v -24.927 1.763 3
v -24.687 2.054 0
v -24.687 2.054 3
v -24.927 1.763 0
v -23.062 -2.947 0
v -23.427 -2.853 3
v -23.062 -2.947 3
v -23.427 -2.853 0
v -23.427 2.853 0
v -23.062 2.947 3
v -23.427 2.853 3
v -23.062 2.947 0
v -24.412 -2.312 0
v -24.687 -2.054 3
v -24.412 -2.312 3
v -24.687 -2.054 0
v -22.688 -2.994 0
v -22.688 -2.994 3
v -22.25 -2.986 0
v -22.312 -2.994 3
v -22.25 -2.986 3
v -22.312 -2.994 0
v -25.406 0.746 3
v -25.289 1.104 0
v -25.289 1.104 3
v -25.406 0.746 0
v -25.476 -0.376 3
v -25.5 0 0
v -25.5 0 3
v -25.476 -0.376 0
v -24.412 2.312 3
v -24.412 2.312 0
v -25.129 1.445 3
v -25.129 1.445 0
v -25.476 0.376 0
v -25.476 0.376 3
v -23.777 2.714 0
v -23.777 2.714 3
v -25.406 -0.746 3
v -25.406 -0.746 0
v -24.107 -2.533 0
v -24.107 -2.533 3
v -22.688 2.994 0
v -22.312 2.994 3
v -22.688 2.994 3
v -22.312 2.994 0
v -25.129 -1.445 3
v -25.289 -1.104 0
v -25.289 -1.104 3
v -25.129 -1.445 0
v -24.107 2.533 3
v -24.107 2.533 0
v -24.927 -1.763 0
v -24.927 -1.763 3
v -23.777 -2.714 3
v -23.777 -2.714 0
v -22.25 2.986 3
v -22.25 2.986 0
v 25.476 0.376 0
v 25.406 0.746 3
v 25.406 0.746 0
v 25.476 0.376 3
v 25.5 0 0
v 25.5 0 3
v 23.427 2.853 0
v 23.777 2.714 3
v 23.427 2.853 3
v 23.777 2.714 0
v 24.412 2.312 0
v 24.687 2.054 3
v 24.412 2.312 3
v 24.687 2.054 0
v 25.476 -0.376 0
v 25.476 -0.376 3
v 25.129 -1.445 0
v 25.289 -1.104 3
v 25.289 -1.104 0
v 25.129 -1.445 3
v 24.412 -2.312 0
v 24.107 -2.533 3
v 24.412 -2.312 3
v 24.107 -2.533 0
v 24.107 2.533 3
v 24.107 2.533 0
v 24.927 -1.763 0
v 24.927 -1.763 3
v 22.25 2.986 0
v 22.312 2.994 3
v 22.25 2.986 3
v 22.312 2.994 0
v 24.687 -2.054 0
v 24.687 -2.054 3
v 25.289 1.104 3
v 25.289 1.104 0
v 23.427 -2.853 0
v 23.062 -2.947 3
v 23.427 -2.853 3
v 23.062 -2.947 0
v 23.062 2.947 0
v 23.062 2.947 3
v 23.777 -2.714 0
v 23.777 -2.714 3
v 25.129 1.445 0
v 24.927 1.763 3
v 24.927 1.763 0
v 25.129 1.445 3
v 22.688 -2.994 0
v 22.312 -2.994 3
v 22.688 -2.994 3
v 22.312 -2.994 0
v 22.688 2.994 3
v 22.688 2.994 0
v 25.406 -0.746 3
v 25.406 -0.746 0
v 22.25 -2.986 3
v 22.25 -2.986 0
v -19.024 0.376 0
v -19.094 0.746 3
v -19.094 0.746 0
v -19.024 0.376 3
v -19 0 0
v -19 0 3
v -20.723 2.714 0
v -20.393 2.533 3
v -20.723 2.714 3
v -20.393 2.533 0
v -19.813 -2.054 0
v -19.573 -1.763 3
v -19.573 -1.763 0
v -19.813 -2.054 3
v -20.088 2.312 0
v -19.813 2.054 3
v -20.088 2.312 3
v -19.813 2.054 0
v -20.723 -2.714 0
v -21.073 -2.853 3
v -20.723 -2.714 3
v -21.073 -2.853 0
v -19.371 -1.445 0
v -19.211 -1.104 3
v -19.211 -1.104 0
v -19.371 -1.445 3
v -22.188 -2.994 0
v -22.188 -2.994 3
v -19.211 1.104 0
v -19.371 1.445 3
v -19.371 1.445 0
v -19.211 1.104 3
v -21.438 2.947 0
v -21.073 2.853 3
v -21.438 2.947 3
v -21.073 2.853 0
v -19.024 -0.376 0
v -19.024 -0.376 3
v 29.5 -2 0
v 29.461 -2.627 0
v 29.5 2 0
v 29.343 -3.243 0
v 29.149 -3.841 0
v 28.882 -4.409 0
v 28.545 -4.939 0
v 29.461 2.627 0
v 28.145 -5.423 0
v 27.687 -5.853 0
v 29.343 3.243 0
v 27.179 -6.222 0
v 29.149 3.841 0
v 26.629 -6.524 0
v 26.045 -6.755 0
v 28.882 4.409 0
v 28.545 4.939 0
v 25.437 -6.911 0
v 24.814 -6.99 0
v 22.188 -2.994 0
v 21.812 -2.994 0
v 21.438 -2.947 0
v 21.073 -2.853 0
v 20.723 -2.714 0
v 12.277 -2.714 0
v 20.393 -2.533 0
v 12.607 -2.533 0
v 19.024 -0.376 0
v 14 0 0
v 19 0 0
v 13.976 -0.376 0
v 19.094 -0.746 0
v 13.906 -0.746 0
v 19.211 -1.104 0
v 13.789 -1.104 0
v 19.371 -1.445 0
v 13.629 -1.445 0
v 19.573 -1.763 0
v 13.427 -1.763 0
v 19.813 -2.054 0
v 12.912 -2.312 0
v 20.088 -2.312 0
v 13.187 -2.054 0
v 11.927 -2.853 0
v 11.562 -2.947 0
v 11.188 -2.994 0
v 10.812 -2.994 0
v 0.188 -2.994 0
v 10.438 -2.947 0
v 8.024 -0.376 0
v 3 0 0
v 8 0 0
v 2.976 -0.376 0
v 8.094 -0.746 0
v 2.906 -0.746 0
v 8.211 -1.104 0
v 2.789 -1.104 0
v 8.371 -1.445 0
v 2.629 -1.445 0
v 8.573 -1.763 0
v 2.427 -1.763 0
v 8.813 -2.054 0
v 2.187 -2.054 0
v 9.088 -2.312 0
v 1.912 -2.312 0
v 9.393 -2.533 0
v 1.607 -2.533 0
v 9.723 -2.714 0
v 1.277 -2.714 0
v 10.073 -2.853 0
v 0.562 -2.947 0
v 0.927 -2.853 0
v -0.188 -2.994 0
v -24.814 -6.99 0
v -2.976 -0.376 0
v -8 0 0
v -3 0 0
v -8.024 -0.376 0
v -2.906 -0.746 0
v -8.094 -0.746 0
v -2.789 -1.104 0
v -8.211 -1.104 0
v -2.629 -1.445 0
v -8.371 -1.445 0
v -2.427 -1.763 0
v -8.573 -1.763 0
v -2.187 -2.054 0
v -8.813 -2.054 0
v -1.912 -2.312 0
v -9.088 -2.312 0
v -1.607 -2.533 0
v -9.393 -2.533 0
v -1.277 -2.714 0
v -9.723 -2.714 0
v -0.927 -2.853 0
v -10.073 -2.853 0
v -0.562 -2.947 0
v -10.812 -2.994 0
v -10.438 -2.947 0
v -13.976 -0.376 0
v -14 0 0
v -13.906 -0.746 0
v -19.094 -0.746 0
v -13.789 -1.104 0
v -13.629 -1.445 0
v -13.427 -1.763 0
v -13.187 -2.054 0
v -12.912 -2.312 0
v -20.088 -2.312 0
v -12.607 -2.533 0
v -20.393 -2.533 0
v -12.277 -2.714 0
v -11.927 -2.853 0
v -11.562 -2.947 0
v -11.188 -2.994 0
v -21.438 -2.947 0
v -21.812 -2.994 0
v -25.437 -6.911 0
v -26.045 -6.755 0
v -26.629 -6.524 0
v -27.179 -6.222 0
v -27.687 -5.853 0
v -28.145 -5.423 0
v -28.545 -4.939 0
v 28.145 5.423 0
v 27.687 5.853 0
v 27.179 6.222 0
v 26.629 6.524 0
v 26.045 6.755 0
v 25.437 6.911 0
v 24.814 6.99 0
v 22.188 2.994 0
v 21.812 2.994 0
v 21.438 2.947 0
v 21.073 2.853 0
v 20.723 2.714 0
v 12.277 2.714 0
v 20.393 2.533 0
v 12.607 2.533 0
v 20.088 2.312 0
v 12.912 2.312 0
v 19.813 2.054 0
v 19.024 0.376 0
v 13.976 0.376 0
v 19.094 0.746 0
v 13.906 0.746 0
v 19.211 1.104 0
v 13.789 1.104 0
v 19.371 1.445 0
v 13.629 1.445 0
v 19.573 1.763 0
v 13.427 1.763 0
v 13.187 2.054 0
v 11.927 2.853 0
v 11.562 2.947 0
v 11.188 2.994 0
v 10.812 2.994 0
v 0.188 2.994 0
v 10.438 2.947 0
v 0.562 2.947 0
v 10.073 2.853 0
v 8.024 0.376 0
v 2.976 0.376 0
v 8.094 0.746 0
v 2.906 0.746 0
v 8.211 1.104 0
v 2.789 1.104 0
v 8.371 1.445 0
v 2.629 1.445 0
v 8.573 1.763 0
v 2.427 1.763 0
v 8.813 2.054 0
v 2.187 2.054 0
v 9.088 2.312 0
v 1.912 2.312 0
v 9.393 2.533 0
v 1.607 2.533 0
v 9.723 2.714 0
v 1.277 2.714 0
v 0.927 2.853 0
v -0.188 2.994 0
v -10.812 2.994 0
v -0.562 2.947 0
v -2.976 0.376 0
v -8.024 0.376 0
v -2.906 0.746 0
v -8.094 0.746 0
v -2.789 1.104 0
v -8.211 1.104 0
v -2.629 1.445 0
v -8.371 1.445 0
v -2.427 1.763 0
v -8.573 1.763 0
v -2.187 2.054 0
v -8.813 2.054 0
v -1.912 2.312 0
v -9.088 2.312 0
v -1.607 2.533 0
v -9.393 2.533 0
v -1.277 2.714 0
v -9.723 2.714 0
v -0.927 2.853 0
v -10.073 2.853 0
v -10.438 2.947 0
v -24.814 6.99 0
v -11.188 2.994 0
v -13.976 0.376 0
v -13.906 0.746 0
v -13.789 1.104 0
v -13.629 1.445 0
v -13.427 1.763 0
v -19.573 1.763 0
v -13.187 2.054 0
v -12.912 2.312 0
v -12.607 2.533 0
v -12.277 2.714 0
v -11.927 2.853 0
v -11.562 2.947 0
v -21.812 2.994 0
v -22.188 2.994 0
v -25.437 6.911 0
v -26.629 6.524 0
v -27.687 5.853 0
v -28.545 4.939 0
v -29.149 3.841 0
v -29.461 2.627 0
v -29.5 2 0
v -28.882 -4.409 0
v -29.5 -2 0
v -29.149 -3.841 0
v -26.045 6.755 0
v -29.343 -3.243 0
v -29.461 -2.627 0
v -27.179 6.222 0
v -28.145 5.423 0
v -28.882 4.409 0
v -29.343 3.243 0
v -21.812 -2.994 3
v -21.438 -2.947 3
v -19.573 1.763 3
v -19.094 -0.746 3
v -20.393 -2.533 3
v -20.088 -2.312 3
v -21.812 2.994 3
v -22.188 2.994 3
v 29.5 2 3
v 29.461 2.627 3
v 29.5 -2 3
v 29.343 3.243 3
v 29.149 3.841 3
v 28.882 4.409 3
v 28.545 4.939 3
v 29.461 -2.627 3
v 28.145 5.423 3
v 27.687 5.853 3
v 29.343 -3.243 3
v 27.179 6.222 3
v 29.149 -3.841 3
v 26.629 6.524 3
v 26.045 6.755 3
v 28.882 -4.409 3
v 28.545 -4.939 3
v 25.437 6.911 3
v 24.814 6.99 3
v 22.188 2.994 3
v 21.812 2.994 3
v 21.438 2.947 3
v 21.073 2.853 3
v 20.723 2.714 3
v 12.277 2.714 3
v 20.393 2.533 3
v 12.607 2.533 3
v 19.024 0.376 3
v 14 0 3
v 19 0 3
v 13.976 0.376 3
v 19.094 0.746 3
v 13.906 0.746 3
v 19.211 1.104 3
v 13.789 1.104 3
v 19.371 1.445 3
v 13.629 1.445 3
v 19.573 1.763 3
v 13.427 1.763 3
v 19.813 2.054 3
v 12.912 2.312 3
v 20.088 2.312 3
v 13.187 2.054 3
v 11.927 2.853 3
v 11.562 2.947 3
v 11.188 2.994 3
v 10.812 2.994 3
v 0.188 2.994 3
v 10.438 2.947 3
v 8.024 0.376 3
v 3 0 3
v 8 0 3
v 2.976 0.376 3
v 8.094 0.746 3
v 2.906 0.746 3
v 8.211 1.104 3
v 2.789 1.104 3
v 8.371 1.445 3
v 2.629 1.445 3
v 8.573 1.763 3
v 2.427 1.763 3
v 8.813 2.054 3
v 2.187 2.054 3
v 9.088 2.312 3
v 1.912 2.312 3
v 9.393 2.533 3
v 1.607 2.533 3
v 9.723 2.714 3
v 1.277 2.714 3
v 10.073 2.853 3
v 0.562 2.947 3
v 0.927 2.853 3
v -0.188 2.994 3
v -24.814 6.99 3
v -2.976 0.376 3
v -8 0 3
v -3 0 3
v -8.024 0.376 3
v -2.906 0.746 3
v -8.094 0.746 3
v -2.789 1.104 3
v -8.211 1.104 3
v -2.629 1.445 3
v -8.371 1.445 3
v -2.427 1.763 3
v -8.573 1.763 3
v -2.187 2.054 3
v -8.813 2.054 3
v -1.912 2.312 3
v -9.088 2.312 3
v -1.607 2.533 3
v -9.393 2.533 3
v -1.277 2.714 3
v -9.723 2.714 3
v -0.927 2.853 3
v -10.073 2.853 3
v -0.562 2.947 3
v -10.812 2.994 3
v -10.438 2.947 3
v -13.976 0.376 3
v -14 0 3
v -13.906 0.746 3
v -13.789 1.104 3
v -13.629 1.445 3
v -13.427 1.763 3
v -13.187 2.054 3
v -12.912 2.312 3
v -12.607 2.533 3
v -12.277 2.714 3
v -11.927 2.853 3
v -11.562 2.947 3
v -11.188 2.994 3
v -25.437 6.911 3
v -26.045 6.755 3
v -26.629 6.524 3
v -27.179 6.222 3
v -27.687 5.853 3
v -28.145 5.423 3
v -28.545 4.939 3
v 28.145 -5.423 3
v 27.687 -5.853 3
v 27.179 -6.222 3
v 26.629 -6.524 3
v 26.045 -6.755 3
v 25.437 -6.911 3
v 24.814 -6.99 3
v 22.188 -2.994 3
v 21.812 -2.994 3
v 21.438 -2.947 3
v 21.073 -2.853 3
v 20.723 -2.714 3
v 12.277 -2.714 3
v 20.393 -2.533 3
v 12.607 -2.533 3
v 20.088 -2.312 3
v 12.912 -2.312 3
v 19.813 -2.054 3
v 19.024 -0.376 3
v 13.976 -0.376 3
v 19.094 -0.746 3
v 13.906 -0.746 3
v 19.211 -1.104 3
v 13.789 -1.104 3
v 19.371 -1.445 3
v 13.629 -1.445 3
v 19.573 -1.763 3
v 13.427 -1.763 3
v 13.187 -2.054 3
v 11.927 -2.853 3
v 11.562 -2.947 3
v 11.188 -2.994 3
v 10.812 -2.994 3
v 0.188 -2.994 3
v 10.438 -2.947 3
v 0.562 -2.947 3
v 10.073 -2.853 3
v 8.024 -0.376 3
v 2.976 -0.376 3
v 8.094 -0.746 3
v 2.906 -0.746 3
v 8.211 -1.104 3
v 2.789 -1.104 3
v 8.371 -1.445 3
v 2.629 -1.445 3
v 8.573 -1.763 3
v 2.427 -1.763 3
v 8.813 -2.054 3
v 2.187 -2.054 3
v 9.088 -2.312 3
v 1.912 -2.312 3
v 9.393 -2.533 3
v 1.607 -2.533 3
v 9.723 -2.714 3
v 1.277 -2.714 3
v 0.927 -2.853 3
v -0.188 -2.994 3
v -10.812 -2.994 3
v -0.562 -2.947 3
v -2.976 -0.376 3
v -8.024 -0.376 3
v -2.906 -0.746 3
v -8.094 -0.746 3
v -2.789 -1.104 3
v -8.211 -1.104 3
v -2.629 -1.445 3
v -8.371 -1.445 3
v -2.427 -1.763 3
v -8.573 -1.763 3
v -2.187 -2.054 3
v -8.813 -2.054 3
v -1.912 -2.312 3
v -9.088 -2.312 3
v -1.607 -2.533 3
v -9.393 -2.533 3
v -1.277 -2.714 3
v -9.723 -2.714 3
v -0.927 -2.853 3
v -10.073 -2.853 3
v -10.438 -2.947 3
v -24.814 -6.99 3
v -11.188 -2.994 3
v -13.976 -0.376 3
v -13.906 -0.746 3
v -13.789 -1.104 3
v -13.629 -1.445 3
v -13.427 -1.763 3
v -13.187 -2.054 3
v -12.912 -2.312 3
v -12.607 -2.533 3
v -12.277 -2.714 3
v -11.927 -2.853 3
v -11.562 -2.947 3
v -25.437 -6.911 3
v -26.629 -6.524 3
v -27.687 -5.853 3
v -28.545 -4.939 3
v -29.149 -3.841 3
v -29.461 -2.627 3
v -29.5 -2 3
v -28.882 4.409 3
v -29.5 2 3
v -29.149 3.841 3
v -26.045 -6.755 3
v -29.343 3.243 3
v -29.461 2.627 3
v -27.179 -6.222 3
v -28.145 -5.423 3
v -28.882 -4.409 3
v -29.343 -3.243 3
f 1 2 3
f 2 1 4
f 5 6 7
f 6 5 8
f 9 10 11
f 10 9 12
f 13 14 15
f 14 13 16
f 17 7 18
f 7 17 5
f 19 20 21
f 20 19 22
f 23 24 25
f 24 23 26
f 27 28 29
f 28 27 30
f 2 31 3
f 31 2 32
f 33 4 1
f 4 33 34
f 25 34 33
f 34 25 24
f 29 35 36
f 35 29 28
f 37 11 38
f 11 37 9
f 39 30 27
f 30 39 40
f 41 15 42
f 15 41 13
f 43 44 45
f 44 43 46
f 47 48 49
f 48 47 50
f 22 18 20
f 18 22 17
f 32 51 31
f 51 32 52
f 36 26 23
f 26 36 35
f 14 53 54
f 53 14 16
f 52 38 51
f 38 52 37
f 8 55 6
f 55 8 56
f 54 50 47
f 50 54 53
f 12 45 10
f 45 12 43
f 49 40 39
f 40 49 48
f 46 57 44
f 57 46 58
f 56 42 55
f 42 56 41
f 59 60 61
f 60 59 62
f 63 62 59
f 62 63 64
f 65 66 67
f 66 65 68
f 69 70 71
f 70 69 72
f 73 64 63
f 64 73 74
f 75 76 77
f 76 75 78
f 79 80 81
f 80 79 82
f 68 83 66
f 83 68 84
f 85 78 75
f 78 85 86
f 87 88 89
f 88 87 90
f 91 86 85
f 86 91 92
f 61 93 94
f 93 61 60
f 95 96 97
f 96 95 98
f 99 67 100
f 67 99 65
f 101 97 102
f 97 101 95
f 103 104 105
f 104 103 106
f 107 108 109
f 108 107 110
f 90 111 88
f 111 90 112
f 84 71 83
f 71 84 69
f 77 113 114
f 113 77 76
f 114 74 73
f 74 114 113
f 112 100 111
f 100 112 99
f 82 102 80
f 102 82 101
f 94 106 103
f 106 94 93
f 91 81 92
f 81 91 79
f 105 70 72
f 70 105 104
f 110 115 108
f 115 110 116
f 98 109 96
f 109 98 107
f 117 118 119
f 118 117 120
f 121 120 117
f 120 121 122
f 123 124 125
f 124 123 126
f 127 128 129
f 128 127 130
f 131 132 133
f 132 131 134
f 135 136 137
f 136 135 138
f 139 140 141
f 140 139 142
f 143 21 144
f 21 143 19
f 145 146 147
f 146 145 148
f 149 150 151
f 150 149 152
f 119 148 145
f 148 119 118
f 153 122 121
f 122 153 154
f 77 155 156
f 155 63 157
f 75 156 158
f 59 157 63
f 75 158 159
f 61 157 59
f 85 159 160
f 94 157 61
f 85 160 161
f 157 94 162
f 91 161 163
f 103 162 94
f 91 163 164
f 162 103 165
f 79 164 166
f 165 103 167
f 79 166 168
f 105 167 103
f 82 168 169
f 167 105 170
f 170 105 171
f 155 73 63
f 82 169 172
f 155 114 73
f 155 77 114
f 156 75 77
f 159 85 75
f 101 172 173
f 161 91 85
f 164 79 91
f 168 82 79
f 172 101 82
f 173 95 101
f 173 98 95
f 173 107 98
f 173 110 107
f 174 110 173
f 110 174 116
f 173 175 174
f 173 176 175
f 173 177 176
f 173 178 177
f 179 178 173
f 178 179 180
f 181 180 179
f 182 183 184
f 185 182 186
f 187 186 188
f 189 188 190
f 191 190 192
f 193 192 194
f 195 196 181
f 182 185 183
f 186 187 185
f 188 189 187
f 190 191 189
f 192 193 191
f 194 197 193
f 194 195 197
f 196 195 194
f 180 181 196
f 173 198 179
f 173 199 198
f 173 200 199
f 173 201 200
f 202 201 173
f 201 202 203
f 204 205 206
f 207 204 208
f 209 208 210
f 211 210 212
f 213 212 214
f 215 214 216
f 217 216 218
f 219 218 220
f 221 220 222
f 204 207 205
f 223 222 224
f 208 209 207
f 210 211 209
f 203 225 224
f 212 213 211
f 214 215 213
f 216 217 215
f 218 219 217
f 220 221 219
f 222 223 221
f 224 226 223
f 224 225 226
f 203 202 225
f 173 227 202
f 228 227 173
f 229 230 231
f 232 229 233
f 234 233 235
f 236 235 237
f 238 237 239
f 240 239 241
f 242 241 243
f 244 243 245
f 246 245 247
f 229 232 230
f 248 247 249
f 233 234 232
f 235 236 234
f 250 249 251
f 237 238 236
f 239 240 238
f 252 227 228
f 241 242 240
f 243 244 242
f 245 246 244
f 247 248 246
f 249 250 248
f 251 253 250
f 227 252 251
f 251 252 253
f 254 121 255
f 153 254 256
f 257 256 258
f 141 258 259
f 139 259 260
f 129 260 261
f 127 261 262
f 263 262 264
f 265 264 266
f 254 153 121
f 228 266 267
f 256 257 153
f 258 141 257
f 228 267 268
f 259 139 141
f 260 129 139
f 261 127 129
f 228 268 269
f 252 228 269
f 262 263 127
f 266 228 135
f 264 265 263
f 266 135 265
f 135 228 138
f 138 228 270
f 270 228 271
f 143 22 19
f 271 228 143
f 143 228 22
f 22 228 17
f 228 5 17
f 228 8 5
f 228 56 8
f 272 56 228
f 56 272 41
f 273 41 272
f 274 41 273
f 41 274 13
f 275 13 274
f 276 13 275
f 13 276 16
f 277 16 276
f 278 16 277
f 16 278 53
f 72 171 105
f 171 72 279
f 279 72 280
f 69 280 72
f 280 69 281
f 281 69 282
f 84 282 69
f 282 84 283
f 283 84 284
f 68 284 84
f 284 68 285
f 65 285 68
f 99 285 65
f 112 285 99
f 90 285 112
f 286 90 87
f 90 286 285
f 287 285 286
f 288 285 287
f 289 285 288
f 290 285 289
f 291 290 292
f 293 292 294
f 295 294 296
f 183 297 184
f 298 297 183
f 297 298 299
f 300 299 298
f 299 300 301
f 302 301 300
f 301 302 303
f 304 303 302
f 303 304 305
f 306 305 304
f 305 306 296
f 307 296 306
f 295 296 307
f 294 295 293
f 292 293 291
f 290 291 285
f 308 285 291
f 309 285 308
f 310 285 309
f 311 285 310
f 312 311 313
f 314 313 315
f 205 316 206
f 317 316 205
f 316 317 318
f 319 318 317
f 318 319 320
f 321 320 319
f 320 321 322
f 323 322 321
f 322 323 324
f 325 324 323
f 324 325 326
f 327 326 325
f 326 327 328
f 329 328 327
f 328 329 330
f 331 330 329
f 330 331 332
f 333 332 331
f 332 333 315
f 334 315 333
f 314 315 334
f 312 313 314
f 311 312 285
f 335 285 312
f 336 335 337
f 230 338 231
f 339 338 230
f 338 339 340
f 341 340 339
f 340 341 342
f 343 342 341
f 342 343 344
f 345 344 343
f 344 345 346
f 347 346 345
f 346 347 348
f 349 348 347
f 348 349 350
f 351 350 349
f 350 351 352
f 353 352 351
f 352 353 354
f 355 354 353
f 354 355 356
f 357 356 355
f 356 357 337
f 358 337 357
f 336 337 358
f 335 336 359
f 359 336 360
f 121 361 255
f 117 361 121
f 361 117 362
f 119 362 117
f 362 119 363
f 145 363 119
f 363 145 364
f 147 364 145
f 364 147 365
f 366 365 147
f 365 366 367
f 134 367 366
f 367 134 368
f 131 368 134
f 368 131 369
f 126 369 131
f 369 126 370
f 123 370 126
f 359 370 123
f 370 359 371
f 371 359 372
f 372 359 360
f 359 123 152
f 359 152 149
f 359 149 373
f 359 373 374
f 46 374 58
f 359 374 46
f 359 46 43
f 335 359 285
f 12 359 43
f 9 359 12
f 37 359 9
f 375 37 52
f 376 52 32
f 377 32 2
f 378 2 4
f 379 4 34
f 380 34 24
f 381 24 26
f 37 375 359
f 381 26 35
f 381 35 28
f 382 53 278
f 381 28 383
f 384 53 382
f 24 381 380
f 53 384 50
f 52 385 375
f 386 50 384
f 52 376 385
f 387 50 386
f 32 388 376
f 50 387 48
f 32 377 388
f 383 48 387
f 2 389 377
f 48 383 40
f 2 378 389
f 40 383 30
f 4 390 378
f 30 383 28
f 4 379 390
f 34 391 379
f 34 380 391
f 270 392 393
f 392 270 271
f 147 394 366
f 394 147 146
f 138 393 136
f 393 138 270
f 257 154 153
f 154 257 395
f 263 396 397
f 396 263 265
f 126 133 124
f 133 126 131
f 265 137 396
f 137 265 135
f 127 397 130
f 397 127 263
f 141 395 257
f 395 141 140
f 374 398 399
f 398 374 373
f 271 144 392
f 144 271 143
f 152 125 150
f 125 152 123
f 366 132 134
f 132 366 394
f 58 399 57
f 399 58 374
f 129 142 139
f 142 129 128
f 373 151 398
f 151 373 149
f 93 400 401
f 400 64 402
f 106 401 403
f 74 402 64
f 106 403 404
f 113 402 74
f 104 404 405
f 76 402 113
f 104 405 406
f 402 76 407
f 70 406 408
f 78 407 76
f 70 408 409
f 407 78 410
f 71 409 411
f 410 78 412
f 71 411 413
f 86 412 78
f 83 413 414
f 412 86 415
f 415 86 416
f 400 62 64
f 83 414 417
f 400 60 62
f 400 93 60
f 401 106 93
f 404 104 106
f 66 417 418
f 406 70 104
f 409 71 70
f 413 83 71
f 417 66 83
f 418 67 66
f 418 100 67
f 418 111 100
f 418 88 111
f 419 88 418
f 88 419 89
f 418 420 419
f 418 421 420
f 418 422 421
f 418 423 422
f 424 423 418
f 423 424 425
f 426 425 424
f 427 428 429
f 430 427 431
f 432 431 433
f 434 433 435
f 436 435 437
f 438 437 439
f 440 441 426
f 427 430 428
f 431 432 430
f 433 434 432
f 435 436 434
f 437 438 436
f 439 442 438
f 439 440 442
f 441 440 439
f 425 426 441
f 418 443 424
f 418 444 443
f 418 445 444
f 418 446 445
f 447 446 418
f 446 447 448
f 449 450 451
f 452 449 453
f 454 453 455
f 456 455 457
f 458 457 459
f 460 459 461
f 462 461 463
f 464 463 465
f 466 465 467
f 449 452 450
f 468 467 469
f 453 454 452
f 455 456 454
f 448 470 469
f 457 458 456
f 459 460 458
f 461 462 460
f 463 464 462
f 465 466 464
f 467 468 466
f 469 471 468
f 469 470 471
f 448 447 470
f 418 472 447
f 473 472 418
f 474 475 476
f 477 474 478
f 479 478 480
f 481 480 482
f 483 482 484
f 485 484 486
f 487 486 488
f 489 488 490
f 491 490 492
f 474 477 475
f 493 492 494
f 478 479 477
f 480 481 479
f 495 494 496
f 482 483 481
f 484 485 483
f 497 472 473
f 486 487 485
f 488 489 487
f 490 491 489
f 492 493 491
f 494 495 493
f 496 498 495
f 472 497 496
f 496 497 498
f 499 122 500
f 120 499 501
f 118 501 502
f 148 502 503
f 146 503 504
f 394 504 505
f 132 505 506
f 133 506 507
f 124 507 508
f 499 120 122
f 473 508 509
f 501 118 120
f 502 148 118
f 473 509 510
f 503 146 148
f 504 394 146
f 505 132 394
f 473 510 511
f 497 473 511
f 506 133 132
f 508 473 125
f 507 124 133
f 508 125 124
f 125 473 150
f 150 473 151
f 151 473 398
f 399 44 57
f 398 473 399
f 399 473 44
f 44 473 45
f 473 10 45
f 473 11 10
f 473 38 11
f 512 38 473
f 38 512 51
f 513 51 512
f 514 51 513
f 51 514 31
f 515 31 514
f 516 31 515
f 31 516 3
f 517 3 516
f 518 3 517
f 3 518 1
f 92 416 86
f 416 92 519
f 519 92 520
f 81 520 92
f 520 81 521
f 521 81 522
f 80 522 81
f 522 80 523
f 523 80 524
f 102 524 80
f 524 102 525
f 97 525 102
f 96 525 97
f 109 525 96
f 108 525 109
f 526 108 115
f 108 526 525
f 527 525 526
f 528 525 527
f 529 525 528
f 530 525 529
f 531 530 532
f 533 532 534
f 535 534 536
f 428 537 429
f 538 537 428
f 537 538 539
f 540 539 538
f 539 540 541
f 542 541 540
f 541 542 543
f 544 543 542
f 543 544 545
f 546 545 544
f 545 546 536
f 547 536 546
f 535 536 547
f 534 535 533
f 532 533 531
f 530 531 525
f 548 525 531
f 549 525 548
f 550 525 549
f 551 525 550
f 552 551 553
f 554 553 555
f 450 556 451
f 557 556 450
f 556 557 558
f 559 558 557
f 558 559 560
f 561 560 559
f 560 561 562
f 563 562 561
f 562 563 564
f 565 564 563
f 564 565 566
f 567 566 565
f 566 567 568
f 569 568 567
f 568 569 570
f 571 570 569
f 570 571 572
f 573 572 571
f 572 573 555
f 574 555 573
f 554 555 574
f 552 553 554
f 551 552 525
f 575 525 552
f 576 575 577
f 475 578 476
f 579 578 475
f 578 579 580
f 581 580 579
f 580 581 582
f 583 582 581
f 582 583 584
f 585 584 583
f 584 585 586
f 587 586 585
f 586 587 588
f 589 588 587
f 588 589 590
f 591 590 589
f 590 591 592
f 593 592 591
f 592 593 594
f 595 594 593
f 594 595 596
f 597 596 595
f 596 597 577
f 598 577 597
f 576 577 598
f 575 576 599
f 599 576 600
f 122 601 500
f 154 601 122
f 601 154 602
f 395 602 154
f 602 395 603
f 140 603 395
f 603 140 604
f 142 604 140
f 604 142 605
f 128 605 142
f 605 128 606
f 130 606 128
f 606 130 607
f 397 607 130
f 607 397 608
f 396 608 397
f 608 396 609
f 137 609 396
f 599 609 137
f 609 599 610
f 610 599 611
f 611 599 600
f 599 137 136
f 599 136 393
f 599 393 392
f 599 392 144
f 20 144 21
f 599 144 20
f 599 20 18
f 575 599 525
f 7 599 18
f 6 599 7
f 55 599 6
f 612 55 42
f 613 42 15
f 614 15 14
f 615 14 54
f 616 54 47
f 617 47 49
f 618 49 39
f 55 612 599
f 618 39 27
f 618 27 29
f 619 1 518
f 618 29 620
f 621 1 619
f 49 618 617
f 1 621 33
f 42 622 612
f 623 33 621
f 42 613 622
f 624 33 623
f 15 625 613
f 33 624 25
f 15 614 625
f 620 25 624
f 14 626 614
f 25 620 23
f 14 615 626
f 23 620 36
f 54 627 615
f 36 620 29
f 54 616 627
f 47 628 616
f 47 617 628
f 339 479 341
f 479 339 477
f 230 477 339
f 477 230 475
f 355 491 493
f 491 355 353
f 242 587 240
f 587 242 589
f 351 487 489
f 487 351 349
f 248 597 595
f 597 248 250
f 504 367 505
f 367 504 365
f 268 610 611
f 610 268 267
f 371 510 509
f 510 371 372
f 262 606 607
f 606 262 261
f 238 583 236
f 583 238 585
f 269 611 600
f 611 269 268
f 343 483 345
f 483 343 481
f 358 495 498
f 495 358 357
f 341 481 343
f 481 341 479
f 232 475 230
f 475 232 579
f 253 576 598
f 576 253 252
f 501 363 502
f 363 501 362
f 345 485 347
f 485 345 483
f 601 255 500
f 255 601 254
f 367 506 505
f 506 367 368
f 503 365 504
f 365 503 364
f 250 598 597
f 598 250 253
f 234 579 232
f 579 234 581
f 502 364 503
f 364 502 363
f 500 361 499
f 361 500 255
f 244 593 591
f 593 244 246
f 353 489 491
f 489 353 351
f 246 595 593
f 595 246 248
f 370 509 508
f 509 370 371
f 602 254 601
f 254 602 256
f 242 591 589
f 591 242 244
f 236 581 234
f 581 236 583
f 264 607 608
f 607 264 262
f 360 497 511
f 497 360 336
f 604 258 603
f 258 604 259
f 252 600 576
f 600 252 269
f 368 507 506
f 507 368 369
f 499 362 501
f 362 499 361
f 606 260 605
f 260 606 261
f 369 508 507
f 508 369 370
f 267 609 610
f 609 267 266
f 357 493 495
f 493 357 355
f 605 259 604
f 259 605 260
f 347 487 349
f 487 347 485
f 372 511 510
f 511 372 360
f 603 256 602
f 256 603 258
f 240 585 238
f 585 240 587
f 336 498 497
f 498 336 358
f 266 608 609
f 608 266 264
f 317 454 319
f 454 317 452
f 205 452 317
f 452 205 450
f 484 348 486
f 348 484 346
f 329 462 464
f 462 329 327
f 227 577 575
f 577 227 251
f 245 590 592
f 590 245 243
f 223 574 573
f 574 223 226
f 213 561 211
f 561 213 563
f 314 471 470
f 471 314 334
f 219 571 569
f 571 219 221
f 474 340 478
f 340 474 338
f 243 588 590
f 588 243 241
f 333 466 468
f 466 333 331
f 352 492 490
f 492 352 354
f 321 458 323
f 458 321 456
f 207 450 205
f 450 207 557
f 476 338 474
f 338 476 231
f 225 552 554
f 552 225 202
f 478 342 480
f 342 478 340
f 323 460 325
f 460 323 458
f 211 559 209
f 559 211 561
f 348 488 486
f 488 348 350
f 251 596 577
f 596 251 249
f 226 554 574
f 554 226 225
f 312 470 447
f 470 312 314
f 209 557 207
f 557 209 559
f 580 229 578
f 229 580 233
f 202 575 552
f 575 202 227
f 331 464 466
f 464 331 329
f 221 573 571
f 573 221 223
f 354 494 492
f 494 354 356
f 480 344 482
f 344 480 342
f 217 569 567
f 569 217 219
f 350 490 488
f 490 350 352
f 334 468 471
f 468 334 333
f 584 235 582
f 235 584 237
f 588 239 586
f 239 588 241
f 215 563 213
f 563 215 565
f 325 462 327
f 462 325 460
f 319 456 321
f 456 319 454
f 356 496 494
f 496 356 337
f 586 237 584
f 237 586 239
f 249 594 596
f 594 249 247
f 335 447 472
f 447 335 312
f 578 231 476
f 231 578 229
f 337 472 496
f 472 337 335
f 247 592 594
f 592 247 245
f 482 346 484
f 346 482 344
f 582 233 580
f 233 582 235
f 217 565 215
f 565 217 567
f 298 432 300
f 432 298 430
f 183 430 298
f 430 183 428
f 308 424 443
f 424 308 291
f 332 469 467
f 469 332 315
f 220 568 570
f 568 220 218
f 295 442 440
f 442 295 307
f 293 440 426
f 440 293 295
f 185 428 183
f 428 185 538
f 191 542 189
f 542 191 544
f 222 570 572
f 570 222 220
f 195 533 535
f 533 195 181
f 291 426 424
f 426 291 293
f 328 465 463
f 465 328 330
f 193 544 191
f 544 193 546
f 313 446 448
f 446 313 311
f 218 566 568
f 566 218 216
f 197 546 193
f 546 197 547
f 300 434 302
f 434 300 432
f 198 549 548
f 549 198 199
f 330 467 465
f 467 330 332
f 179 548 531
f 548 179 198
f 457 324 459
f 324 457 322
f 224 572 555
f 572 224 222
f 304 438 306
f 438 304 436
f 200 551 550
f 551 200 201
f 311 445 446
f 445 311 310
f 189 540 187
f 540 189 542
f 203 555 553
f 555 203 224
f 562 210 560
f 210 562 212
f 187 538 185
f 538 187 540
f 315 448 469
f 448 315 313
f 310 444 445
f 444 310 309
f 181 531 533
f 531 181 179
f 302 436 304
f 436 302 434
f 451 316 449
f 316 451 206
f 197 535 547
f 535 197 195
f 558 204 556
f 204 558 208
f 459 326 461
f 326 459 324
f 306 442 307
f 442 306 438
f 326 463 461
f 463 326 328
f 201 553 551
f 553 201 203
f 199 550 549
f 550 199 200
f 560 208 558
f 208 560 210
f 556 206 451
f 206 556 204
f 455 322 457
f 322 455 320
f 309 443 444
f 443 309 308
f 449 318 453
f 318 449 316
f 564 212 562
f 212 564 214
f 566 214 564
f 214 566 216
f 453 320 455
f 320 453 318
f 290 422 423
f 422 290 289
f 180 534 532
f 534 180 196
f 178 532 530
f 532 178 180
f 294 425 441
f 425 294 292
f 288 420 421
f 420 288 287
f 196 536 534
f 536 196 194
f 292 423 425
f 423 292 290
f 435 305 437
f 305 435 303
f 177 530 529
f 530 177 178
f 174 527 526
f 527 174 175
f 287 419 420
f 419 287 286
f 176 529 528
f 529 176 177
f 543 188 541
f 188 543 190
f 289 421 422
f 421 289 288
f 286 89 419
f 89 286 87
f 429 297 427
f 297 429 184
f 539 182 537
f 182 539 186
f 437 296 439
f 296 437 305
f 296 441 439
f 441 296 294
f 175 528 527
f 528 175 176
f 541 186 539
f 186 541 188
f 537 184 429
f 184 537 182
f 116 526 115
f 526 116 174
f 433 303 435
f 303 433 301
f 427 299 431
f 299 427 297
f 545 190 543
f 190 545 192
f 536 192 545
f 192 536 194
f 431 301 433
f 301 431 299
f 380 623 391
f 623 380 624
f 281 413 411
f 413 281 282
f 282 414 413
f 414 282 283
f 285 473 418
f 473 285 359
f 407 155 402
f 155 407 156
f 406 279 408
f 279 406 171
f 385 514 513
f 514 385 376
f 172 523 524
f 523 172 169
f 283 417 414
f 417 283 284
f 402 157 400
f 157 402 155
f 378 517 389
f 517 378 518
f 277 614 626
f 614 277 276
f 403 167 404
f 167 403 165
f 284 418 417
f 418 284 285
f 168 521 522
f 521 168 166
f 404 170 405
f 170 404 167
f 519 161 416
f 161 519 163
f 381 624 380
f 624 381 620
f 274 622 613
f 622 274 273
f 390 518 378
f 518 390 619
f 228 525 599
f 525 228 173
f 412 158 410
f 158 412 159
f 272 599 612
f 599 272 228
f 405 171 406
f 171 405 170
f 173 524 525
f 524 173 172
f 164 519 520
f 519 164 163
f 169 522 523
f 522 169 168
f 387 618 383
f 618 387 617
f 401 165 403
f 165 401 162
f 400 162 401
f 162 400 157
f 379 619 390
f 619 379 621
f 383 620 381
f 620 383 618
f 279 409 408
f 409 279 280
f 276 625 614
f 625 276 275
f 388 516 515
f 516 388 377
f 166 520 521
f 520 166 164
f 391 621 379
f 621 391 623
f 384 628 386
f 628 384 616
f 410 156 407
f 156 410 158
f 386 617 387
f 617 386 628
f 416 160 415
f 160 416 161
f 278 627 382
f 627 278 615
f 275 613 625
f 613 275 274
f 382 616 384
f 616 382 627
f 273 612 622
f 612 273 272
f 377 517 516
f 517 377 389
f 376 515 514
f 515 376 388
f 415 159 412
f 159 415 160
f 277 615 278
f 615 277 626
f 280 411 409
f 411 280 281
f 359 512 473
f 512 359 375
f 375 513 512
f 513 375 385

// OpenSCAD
$fn = 50;


difference() {
	union() {
		hull() {
			translate(v = [-24.5000000000, 2.0000000000, 0]) {
				cylinder(h = 3, r = 5);
			}
			translate(v = [24.5000000000, 2.0000000000, 0]) {
				cylinder(h = 3, r = 5);
			}
			translate(v = [-24.5000000000, -2.0000000000, 0]) {
				cylinder(h = 3, r = 5);
			}
			translate(v = [24.5000000000, -2.0000000000, 0]) {
				cylinder(h = 3, r = 5);
			}
		}
	}
	union() {
		#translate(v = [-22.5000000000, 0.0000000000, -100.0000000000]) {
			cylinder(h = 200, r = 3.0000000000);
		}
		#translate(v = [-22.5000000000, 0.0000000000, -100.0000000000]) {
			cylinder(h = 200, r = 3.0000000000);
		}
		#translate(v = [22.5000000000, 0.0000000000, -100.0000000000]) {
			cylinder(h = 200, r = 3.0000000000);
		}
		#translate(v = [22.5000000000, 0.0000000000, -100.0000000000]) {
			cylinder(h = 200, r = 3.0000000000);
		}
		#translate(v = [-22.0000000000, 0, 0]) {
			cylinder(h = 3, r = 3.0000000000);
		}
		#translate(v = [-11.0000000000, 0, 0]) {
			cylinder(h = 3, r = 3.0000000000);
		}
		#cylinder(h = 3, r = 3.0000000000);
		#translate(v = [11.0000000000, 0, 0]) {
			cylinder(h = 3, r = 3.0000000000);
		}
		#translate(v = [22.0000000000, 0, 0]) {
			cylinder(h = 3, r = 3.0000000000);
		}
	}
}
